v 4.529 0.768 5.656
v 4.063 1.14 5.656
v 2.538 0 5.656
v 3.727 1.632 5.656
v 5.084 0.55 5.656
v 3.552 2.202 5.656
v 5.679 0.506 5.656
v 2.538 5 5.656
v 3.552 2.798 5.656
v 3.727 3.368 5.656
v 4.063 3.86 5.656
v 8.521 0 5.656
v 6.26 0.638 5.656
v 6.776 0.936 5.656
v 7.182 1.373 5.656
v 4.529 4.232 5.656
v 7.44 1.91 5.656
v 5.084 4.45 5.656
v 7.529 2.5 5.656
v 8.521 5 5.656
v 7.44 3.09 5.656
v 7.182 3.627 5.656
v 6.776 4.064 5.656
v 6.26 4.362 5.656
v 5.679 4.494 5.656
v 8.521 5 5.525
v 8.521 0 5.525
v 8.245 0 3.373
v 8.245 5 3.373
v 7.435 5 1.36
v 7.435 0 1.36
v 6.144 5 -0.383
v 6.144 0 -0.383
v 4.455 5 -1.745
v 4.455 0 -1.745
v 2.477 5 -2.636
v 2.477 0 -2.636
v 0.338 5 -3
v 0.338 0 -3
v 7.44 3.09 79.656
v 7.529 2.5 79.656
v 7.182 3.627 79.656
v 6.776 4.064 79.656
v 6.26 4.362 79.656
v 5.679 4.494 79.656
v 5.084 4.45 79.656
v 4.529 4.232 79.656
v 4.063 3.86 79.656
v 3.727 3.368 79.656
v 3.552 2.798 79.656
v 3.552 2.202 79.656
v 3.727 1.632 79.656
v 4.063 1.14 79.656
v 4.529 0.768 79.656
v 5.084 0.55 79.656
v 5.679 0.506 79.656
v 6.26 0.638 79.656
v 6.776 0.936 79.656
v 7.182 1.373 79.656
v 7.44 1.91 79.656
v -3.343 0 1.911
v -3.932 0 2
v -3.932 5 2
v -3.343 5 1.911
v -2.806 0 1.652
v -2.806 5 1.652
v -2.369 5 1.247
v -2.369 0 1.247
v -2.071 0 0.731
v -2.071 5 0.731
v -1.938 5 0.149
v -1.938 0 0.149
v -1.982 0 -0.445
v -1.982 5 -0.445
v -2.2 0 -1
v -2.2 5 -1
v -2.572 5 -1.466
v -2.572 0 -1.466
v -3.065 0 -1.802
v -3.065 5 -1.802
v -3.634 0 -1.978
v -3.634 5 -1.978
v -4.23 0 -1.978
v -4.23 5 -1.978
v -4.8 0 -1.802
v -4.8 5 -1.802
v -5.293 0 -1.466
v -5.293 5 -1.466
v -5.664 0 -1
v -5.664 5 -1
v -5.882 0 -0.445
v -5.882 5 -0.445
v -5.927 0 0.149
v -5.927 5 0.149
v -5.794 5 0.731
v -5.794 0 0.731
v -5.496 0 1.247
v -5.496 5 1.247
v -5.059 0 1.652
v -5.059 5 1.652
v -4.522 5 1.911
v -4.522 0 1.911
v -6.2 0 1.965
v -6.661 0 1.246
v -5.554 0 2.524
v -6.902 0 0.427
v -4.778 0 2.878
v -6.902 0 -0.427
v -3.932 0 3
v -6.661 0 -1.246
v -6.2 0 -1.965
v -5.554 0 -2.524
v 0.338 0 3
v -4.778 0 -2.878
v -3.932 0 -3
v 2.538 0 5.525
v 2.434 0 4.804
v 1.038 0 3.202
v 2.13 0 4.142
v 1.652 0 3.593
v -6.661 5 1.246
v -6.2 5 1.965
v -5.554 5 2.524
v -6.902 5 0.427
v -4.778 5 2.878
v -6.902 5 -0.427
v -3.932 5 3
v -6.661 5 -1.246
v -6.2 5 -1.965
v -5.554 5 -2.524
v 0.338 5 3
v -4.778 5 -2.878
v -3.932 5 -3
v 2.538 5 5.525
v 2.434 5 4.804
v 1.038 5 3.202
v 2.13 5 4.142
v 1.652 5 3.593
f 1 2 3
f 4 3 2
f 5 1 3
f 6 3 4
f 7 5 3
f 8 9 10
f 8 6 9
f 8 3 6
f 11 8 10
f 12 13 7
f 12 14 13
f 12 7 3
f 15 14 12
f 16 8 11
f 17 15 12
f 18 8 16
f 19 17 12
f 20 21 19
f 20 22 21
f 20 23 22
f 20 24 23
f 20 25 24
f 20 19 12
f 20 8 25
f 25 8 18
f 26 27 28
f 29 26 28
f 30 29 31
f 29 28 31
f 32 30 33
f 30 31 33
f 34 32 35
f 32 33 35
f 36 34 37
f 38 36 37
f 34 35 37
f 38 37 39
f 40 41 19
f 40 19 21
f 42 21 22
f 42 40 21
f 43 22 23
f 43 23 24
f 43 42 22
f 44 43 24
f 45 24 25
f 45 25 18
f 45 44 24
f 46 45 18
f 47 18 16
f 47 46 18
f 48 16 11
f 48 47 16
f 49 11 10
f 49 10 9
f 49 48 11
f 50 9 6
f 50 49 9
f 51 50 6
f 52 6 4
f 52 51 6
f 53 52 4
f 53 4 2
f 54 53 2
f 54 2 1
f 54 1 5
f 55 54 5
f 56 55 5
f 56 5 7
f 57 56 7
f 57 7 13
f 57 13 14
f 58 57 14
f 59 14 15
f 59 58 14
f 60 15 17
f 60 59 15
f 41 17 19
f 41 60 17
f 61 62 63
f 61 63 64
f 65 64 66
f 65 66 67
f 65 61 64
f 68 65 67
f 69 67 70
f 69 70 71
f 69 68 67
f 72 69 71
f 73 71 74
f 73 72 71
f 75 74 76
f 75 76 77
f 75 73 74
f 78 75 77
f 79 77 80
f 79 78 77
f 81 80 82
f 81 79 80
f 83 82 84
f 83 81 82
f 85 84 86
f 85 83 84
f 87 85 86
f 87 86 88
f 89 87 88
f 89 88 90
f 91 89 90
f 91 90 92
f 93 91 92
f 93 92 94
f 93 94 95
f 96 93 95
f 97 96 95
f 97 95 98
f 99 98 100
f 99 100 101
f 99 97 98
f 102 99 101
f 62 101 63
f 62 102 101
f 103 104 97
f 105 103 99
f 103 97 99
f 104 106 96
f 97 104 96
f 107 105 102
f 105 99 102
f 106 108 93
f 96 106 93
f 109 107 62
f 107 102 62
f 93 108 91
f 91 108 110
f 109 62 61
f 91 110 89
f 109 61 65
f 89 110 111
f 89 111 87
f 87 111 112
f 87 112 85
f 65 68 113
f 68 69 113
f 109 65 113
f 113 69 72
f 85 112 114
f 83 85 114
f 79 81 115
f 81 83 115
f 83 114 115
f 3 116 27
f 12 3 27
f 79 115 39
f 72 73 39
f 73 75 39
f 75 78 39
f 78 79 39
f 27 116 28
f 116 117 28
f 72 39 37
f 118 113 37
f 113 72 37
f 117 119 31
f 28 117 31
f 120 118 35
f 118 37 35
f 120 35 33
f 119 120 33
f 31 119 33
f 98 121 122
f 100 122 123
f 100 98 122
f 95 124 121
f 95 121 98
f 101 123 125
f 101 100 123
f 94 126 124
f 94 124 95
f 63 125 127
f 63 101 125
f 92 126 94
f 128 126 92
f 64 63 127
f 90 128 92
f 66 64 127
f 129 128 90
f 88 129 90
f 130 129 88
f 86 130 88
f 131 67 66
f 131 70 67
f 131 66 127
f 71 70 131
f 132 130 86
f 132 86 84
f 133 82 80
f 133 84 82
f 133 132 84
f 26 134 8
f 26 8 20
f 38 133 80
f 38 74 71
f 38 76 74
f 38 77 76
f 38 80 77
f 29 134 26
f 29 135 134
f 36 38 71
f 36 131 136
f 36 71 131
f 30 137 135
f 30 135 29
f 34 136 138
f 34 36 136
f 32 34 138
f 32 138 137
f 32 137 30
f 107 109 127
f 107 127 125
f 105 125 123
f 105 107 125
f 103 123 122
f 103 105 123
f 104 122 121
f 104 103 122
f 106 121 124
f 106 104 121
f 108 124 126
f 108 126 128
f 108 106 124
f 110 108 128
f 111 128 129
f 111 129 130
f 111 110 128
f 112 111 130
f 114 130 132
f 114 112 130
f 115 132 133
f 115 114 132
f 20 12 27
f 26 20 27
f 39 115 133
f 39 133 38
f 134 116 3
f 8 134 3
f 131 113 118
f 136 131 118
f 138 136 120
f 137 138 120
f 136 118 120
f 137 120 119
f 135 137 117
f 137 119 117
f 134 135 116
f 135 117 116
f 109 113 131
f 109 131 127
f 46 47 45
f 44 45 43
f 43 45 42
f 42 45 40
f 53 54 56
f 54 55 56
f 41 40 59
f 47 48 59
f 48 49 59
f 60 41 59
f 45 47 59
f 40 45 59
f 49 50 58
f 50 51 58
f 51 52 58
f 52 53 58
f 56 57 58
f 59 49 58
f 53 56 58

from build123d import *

# Parameters (mm, degrees)
SKETCH_2_R          = 2
EXTRUDE_2_DEPTH     = 5
EXTRUDE_3_DEPTH     = 5
SKETCH_4_OUTSIDE_W  = 34.301
SKETCH_4_OUTSIDE_H  = 23.848
SKETCH_4_OUTSIDE_R  = 2
CUT_EXTRUDE_1_DEPTH = 74


with BuildPart() as part:
    # 草图2 → 凸台-拉伸2 (new body)
    with BuildSketch(Plane(origin=(0, 0, 0), x_dir=(1, 0, 0), z_dir=(0, 1, 0))):
        with BuildLine():
            Line((-3.932336285, 3), (0.337762879, 3))
            Line((0.337762879, 3), (0.337762879, -3))
            Line((0.337762879, -3), (-3.932336285, -3))
            ThreePointArc((-3.932336285, -3), (-6.932336285, 0), (-3.932336285, 3))
        make_face()
        with Locations(Location((-3.932336285, 0, 0), (0, 0, 270))):
            Circle(SKETCH_2_R, mode=Mode.SUBTRACT)
    extrude(amount=EXTRUDE_2_DEPTH)

    # 草图3 → 凸台-拉伸3 (add)
    with BuildSketch(Plane(origin=(0, 0, 0), x_dir=(1, 0, 0), z_dir=(0, 1, 0))):
        with BuildLine():
            Line((2.537654461, -79.655778605), (8.520746385, -79.655778605))
            Line((8.520746385, -79.655778605), (8.520746385, -8.429696767))
            Line((8.520746385, -8.429696767), (8.520746385, -5.525308021))
            ThreePointArc((8.520746385, -5.525308021), (6.143965834, 0.383204819), (0.337762879, 3))
            Line((0.337762879, 3), (0.337762879, -3))
            ThreePointArc((0.337762879, -3), (1.910553846, -3.850740646), (2.537654461, -5.525308021))
            Line((2.537654461, -5.525308021), (2.537654461, -8.429696767))
            Line((2.537654461, -8.429696767), (2.537654461, -79.655778605))
        make_face()
    extrude(amount=EXTRUDE_3_DEPTH)

    # 草图4 outside → 切除-拉伸1 (cut)
    with BuildSketch(Plane.XY.offset(79.655778605)):
        with Locations((0.7945, 2.5)):
            Rectangle(SKETCH_4_OUTSIDE_W, SKETCH_4_OUTSIDE_H)
        with Locations((5.529200423, 2.5)):
            Circle(SKETCH_4_OUTSIDE_R, mode=Mode.SUBTRACT)
    extrude(amount=-CUT_EXTRUDE_1_DEPTH, mode=Mode.SUBTRACT)


solid = part.part
